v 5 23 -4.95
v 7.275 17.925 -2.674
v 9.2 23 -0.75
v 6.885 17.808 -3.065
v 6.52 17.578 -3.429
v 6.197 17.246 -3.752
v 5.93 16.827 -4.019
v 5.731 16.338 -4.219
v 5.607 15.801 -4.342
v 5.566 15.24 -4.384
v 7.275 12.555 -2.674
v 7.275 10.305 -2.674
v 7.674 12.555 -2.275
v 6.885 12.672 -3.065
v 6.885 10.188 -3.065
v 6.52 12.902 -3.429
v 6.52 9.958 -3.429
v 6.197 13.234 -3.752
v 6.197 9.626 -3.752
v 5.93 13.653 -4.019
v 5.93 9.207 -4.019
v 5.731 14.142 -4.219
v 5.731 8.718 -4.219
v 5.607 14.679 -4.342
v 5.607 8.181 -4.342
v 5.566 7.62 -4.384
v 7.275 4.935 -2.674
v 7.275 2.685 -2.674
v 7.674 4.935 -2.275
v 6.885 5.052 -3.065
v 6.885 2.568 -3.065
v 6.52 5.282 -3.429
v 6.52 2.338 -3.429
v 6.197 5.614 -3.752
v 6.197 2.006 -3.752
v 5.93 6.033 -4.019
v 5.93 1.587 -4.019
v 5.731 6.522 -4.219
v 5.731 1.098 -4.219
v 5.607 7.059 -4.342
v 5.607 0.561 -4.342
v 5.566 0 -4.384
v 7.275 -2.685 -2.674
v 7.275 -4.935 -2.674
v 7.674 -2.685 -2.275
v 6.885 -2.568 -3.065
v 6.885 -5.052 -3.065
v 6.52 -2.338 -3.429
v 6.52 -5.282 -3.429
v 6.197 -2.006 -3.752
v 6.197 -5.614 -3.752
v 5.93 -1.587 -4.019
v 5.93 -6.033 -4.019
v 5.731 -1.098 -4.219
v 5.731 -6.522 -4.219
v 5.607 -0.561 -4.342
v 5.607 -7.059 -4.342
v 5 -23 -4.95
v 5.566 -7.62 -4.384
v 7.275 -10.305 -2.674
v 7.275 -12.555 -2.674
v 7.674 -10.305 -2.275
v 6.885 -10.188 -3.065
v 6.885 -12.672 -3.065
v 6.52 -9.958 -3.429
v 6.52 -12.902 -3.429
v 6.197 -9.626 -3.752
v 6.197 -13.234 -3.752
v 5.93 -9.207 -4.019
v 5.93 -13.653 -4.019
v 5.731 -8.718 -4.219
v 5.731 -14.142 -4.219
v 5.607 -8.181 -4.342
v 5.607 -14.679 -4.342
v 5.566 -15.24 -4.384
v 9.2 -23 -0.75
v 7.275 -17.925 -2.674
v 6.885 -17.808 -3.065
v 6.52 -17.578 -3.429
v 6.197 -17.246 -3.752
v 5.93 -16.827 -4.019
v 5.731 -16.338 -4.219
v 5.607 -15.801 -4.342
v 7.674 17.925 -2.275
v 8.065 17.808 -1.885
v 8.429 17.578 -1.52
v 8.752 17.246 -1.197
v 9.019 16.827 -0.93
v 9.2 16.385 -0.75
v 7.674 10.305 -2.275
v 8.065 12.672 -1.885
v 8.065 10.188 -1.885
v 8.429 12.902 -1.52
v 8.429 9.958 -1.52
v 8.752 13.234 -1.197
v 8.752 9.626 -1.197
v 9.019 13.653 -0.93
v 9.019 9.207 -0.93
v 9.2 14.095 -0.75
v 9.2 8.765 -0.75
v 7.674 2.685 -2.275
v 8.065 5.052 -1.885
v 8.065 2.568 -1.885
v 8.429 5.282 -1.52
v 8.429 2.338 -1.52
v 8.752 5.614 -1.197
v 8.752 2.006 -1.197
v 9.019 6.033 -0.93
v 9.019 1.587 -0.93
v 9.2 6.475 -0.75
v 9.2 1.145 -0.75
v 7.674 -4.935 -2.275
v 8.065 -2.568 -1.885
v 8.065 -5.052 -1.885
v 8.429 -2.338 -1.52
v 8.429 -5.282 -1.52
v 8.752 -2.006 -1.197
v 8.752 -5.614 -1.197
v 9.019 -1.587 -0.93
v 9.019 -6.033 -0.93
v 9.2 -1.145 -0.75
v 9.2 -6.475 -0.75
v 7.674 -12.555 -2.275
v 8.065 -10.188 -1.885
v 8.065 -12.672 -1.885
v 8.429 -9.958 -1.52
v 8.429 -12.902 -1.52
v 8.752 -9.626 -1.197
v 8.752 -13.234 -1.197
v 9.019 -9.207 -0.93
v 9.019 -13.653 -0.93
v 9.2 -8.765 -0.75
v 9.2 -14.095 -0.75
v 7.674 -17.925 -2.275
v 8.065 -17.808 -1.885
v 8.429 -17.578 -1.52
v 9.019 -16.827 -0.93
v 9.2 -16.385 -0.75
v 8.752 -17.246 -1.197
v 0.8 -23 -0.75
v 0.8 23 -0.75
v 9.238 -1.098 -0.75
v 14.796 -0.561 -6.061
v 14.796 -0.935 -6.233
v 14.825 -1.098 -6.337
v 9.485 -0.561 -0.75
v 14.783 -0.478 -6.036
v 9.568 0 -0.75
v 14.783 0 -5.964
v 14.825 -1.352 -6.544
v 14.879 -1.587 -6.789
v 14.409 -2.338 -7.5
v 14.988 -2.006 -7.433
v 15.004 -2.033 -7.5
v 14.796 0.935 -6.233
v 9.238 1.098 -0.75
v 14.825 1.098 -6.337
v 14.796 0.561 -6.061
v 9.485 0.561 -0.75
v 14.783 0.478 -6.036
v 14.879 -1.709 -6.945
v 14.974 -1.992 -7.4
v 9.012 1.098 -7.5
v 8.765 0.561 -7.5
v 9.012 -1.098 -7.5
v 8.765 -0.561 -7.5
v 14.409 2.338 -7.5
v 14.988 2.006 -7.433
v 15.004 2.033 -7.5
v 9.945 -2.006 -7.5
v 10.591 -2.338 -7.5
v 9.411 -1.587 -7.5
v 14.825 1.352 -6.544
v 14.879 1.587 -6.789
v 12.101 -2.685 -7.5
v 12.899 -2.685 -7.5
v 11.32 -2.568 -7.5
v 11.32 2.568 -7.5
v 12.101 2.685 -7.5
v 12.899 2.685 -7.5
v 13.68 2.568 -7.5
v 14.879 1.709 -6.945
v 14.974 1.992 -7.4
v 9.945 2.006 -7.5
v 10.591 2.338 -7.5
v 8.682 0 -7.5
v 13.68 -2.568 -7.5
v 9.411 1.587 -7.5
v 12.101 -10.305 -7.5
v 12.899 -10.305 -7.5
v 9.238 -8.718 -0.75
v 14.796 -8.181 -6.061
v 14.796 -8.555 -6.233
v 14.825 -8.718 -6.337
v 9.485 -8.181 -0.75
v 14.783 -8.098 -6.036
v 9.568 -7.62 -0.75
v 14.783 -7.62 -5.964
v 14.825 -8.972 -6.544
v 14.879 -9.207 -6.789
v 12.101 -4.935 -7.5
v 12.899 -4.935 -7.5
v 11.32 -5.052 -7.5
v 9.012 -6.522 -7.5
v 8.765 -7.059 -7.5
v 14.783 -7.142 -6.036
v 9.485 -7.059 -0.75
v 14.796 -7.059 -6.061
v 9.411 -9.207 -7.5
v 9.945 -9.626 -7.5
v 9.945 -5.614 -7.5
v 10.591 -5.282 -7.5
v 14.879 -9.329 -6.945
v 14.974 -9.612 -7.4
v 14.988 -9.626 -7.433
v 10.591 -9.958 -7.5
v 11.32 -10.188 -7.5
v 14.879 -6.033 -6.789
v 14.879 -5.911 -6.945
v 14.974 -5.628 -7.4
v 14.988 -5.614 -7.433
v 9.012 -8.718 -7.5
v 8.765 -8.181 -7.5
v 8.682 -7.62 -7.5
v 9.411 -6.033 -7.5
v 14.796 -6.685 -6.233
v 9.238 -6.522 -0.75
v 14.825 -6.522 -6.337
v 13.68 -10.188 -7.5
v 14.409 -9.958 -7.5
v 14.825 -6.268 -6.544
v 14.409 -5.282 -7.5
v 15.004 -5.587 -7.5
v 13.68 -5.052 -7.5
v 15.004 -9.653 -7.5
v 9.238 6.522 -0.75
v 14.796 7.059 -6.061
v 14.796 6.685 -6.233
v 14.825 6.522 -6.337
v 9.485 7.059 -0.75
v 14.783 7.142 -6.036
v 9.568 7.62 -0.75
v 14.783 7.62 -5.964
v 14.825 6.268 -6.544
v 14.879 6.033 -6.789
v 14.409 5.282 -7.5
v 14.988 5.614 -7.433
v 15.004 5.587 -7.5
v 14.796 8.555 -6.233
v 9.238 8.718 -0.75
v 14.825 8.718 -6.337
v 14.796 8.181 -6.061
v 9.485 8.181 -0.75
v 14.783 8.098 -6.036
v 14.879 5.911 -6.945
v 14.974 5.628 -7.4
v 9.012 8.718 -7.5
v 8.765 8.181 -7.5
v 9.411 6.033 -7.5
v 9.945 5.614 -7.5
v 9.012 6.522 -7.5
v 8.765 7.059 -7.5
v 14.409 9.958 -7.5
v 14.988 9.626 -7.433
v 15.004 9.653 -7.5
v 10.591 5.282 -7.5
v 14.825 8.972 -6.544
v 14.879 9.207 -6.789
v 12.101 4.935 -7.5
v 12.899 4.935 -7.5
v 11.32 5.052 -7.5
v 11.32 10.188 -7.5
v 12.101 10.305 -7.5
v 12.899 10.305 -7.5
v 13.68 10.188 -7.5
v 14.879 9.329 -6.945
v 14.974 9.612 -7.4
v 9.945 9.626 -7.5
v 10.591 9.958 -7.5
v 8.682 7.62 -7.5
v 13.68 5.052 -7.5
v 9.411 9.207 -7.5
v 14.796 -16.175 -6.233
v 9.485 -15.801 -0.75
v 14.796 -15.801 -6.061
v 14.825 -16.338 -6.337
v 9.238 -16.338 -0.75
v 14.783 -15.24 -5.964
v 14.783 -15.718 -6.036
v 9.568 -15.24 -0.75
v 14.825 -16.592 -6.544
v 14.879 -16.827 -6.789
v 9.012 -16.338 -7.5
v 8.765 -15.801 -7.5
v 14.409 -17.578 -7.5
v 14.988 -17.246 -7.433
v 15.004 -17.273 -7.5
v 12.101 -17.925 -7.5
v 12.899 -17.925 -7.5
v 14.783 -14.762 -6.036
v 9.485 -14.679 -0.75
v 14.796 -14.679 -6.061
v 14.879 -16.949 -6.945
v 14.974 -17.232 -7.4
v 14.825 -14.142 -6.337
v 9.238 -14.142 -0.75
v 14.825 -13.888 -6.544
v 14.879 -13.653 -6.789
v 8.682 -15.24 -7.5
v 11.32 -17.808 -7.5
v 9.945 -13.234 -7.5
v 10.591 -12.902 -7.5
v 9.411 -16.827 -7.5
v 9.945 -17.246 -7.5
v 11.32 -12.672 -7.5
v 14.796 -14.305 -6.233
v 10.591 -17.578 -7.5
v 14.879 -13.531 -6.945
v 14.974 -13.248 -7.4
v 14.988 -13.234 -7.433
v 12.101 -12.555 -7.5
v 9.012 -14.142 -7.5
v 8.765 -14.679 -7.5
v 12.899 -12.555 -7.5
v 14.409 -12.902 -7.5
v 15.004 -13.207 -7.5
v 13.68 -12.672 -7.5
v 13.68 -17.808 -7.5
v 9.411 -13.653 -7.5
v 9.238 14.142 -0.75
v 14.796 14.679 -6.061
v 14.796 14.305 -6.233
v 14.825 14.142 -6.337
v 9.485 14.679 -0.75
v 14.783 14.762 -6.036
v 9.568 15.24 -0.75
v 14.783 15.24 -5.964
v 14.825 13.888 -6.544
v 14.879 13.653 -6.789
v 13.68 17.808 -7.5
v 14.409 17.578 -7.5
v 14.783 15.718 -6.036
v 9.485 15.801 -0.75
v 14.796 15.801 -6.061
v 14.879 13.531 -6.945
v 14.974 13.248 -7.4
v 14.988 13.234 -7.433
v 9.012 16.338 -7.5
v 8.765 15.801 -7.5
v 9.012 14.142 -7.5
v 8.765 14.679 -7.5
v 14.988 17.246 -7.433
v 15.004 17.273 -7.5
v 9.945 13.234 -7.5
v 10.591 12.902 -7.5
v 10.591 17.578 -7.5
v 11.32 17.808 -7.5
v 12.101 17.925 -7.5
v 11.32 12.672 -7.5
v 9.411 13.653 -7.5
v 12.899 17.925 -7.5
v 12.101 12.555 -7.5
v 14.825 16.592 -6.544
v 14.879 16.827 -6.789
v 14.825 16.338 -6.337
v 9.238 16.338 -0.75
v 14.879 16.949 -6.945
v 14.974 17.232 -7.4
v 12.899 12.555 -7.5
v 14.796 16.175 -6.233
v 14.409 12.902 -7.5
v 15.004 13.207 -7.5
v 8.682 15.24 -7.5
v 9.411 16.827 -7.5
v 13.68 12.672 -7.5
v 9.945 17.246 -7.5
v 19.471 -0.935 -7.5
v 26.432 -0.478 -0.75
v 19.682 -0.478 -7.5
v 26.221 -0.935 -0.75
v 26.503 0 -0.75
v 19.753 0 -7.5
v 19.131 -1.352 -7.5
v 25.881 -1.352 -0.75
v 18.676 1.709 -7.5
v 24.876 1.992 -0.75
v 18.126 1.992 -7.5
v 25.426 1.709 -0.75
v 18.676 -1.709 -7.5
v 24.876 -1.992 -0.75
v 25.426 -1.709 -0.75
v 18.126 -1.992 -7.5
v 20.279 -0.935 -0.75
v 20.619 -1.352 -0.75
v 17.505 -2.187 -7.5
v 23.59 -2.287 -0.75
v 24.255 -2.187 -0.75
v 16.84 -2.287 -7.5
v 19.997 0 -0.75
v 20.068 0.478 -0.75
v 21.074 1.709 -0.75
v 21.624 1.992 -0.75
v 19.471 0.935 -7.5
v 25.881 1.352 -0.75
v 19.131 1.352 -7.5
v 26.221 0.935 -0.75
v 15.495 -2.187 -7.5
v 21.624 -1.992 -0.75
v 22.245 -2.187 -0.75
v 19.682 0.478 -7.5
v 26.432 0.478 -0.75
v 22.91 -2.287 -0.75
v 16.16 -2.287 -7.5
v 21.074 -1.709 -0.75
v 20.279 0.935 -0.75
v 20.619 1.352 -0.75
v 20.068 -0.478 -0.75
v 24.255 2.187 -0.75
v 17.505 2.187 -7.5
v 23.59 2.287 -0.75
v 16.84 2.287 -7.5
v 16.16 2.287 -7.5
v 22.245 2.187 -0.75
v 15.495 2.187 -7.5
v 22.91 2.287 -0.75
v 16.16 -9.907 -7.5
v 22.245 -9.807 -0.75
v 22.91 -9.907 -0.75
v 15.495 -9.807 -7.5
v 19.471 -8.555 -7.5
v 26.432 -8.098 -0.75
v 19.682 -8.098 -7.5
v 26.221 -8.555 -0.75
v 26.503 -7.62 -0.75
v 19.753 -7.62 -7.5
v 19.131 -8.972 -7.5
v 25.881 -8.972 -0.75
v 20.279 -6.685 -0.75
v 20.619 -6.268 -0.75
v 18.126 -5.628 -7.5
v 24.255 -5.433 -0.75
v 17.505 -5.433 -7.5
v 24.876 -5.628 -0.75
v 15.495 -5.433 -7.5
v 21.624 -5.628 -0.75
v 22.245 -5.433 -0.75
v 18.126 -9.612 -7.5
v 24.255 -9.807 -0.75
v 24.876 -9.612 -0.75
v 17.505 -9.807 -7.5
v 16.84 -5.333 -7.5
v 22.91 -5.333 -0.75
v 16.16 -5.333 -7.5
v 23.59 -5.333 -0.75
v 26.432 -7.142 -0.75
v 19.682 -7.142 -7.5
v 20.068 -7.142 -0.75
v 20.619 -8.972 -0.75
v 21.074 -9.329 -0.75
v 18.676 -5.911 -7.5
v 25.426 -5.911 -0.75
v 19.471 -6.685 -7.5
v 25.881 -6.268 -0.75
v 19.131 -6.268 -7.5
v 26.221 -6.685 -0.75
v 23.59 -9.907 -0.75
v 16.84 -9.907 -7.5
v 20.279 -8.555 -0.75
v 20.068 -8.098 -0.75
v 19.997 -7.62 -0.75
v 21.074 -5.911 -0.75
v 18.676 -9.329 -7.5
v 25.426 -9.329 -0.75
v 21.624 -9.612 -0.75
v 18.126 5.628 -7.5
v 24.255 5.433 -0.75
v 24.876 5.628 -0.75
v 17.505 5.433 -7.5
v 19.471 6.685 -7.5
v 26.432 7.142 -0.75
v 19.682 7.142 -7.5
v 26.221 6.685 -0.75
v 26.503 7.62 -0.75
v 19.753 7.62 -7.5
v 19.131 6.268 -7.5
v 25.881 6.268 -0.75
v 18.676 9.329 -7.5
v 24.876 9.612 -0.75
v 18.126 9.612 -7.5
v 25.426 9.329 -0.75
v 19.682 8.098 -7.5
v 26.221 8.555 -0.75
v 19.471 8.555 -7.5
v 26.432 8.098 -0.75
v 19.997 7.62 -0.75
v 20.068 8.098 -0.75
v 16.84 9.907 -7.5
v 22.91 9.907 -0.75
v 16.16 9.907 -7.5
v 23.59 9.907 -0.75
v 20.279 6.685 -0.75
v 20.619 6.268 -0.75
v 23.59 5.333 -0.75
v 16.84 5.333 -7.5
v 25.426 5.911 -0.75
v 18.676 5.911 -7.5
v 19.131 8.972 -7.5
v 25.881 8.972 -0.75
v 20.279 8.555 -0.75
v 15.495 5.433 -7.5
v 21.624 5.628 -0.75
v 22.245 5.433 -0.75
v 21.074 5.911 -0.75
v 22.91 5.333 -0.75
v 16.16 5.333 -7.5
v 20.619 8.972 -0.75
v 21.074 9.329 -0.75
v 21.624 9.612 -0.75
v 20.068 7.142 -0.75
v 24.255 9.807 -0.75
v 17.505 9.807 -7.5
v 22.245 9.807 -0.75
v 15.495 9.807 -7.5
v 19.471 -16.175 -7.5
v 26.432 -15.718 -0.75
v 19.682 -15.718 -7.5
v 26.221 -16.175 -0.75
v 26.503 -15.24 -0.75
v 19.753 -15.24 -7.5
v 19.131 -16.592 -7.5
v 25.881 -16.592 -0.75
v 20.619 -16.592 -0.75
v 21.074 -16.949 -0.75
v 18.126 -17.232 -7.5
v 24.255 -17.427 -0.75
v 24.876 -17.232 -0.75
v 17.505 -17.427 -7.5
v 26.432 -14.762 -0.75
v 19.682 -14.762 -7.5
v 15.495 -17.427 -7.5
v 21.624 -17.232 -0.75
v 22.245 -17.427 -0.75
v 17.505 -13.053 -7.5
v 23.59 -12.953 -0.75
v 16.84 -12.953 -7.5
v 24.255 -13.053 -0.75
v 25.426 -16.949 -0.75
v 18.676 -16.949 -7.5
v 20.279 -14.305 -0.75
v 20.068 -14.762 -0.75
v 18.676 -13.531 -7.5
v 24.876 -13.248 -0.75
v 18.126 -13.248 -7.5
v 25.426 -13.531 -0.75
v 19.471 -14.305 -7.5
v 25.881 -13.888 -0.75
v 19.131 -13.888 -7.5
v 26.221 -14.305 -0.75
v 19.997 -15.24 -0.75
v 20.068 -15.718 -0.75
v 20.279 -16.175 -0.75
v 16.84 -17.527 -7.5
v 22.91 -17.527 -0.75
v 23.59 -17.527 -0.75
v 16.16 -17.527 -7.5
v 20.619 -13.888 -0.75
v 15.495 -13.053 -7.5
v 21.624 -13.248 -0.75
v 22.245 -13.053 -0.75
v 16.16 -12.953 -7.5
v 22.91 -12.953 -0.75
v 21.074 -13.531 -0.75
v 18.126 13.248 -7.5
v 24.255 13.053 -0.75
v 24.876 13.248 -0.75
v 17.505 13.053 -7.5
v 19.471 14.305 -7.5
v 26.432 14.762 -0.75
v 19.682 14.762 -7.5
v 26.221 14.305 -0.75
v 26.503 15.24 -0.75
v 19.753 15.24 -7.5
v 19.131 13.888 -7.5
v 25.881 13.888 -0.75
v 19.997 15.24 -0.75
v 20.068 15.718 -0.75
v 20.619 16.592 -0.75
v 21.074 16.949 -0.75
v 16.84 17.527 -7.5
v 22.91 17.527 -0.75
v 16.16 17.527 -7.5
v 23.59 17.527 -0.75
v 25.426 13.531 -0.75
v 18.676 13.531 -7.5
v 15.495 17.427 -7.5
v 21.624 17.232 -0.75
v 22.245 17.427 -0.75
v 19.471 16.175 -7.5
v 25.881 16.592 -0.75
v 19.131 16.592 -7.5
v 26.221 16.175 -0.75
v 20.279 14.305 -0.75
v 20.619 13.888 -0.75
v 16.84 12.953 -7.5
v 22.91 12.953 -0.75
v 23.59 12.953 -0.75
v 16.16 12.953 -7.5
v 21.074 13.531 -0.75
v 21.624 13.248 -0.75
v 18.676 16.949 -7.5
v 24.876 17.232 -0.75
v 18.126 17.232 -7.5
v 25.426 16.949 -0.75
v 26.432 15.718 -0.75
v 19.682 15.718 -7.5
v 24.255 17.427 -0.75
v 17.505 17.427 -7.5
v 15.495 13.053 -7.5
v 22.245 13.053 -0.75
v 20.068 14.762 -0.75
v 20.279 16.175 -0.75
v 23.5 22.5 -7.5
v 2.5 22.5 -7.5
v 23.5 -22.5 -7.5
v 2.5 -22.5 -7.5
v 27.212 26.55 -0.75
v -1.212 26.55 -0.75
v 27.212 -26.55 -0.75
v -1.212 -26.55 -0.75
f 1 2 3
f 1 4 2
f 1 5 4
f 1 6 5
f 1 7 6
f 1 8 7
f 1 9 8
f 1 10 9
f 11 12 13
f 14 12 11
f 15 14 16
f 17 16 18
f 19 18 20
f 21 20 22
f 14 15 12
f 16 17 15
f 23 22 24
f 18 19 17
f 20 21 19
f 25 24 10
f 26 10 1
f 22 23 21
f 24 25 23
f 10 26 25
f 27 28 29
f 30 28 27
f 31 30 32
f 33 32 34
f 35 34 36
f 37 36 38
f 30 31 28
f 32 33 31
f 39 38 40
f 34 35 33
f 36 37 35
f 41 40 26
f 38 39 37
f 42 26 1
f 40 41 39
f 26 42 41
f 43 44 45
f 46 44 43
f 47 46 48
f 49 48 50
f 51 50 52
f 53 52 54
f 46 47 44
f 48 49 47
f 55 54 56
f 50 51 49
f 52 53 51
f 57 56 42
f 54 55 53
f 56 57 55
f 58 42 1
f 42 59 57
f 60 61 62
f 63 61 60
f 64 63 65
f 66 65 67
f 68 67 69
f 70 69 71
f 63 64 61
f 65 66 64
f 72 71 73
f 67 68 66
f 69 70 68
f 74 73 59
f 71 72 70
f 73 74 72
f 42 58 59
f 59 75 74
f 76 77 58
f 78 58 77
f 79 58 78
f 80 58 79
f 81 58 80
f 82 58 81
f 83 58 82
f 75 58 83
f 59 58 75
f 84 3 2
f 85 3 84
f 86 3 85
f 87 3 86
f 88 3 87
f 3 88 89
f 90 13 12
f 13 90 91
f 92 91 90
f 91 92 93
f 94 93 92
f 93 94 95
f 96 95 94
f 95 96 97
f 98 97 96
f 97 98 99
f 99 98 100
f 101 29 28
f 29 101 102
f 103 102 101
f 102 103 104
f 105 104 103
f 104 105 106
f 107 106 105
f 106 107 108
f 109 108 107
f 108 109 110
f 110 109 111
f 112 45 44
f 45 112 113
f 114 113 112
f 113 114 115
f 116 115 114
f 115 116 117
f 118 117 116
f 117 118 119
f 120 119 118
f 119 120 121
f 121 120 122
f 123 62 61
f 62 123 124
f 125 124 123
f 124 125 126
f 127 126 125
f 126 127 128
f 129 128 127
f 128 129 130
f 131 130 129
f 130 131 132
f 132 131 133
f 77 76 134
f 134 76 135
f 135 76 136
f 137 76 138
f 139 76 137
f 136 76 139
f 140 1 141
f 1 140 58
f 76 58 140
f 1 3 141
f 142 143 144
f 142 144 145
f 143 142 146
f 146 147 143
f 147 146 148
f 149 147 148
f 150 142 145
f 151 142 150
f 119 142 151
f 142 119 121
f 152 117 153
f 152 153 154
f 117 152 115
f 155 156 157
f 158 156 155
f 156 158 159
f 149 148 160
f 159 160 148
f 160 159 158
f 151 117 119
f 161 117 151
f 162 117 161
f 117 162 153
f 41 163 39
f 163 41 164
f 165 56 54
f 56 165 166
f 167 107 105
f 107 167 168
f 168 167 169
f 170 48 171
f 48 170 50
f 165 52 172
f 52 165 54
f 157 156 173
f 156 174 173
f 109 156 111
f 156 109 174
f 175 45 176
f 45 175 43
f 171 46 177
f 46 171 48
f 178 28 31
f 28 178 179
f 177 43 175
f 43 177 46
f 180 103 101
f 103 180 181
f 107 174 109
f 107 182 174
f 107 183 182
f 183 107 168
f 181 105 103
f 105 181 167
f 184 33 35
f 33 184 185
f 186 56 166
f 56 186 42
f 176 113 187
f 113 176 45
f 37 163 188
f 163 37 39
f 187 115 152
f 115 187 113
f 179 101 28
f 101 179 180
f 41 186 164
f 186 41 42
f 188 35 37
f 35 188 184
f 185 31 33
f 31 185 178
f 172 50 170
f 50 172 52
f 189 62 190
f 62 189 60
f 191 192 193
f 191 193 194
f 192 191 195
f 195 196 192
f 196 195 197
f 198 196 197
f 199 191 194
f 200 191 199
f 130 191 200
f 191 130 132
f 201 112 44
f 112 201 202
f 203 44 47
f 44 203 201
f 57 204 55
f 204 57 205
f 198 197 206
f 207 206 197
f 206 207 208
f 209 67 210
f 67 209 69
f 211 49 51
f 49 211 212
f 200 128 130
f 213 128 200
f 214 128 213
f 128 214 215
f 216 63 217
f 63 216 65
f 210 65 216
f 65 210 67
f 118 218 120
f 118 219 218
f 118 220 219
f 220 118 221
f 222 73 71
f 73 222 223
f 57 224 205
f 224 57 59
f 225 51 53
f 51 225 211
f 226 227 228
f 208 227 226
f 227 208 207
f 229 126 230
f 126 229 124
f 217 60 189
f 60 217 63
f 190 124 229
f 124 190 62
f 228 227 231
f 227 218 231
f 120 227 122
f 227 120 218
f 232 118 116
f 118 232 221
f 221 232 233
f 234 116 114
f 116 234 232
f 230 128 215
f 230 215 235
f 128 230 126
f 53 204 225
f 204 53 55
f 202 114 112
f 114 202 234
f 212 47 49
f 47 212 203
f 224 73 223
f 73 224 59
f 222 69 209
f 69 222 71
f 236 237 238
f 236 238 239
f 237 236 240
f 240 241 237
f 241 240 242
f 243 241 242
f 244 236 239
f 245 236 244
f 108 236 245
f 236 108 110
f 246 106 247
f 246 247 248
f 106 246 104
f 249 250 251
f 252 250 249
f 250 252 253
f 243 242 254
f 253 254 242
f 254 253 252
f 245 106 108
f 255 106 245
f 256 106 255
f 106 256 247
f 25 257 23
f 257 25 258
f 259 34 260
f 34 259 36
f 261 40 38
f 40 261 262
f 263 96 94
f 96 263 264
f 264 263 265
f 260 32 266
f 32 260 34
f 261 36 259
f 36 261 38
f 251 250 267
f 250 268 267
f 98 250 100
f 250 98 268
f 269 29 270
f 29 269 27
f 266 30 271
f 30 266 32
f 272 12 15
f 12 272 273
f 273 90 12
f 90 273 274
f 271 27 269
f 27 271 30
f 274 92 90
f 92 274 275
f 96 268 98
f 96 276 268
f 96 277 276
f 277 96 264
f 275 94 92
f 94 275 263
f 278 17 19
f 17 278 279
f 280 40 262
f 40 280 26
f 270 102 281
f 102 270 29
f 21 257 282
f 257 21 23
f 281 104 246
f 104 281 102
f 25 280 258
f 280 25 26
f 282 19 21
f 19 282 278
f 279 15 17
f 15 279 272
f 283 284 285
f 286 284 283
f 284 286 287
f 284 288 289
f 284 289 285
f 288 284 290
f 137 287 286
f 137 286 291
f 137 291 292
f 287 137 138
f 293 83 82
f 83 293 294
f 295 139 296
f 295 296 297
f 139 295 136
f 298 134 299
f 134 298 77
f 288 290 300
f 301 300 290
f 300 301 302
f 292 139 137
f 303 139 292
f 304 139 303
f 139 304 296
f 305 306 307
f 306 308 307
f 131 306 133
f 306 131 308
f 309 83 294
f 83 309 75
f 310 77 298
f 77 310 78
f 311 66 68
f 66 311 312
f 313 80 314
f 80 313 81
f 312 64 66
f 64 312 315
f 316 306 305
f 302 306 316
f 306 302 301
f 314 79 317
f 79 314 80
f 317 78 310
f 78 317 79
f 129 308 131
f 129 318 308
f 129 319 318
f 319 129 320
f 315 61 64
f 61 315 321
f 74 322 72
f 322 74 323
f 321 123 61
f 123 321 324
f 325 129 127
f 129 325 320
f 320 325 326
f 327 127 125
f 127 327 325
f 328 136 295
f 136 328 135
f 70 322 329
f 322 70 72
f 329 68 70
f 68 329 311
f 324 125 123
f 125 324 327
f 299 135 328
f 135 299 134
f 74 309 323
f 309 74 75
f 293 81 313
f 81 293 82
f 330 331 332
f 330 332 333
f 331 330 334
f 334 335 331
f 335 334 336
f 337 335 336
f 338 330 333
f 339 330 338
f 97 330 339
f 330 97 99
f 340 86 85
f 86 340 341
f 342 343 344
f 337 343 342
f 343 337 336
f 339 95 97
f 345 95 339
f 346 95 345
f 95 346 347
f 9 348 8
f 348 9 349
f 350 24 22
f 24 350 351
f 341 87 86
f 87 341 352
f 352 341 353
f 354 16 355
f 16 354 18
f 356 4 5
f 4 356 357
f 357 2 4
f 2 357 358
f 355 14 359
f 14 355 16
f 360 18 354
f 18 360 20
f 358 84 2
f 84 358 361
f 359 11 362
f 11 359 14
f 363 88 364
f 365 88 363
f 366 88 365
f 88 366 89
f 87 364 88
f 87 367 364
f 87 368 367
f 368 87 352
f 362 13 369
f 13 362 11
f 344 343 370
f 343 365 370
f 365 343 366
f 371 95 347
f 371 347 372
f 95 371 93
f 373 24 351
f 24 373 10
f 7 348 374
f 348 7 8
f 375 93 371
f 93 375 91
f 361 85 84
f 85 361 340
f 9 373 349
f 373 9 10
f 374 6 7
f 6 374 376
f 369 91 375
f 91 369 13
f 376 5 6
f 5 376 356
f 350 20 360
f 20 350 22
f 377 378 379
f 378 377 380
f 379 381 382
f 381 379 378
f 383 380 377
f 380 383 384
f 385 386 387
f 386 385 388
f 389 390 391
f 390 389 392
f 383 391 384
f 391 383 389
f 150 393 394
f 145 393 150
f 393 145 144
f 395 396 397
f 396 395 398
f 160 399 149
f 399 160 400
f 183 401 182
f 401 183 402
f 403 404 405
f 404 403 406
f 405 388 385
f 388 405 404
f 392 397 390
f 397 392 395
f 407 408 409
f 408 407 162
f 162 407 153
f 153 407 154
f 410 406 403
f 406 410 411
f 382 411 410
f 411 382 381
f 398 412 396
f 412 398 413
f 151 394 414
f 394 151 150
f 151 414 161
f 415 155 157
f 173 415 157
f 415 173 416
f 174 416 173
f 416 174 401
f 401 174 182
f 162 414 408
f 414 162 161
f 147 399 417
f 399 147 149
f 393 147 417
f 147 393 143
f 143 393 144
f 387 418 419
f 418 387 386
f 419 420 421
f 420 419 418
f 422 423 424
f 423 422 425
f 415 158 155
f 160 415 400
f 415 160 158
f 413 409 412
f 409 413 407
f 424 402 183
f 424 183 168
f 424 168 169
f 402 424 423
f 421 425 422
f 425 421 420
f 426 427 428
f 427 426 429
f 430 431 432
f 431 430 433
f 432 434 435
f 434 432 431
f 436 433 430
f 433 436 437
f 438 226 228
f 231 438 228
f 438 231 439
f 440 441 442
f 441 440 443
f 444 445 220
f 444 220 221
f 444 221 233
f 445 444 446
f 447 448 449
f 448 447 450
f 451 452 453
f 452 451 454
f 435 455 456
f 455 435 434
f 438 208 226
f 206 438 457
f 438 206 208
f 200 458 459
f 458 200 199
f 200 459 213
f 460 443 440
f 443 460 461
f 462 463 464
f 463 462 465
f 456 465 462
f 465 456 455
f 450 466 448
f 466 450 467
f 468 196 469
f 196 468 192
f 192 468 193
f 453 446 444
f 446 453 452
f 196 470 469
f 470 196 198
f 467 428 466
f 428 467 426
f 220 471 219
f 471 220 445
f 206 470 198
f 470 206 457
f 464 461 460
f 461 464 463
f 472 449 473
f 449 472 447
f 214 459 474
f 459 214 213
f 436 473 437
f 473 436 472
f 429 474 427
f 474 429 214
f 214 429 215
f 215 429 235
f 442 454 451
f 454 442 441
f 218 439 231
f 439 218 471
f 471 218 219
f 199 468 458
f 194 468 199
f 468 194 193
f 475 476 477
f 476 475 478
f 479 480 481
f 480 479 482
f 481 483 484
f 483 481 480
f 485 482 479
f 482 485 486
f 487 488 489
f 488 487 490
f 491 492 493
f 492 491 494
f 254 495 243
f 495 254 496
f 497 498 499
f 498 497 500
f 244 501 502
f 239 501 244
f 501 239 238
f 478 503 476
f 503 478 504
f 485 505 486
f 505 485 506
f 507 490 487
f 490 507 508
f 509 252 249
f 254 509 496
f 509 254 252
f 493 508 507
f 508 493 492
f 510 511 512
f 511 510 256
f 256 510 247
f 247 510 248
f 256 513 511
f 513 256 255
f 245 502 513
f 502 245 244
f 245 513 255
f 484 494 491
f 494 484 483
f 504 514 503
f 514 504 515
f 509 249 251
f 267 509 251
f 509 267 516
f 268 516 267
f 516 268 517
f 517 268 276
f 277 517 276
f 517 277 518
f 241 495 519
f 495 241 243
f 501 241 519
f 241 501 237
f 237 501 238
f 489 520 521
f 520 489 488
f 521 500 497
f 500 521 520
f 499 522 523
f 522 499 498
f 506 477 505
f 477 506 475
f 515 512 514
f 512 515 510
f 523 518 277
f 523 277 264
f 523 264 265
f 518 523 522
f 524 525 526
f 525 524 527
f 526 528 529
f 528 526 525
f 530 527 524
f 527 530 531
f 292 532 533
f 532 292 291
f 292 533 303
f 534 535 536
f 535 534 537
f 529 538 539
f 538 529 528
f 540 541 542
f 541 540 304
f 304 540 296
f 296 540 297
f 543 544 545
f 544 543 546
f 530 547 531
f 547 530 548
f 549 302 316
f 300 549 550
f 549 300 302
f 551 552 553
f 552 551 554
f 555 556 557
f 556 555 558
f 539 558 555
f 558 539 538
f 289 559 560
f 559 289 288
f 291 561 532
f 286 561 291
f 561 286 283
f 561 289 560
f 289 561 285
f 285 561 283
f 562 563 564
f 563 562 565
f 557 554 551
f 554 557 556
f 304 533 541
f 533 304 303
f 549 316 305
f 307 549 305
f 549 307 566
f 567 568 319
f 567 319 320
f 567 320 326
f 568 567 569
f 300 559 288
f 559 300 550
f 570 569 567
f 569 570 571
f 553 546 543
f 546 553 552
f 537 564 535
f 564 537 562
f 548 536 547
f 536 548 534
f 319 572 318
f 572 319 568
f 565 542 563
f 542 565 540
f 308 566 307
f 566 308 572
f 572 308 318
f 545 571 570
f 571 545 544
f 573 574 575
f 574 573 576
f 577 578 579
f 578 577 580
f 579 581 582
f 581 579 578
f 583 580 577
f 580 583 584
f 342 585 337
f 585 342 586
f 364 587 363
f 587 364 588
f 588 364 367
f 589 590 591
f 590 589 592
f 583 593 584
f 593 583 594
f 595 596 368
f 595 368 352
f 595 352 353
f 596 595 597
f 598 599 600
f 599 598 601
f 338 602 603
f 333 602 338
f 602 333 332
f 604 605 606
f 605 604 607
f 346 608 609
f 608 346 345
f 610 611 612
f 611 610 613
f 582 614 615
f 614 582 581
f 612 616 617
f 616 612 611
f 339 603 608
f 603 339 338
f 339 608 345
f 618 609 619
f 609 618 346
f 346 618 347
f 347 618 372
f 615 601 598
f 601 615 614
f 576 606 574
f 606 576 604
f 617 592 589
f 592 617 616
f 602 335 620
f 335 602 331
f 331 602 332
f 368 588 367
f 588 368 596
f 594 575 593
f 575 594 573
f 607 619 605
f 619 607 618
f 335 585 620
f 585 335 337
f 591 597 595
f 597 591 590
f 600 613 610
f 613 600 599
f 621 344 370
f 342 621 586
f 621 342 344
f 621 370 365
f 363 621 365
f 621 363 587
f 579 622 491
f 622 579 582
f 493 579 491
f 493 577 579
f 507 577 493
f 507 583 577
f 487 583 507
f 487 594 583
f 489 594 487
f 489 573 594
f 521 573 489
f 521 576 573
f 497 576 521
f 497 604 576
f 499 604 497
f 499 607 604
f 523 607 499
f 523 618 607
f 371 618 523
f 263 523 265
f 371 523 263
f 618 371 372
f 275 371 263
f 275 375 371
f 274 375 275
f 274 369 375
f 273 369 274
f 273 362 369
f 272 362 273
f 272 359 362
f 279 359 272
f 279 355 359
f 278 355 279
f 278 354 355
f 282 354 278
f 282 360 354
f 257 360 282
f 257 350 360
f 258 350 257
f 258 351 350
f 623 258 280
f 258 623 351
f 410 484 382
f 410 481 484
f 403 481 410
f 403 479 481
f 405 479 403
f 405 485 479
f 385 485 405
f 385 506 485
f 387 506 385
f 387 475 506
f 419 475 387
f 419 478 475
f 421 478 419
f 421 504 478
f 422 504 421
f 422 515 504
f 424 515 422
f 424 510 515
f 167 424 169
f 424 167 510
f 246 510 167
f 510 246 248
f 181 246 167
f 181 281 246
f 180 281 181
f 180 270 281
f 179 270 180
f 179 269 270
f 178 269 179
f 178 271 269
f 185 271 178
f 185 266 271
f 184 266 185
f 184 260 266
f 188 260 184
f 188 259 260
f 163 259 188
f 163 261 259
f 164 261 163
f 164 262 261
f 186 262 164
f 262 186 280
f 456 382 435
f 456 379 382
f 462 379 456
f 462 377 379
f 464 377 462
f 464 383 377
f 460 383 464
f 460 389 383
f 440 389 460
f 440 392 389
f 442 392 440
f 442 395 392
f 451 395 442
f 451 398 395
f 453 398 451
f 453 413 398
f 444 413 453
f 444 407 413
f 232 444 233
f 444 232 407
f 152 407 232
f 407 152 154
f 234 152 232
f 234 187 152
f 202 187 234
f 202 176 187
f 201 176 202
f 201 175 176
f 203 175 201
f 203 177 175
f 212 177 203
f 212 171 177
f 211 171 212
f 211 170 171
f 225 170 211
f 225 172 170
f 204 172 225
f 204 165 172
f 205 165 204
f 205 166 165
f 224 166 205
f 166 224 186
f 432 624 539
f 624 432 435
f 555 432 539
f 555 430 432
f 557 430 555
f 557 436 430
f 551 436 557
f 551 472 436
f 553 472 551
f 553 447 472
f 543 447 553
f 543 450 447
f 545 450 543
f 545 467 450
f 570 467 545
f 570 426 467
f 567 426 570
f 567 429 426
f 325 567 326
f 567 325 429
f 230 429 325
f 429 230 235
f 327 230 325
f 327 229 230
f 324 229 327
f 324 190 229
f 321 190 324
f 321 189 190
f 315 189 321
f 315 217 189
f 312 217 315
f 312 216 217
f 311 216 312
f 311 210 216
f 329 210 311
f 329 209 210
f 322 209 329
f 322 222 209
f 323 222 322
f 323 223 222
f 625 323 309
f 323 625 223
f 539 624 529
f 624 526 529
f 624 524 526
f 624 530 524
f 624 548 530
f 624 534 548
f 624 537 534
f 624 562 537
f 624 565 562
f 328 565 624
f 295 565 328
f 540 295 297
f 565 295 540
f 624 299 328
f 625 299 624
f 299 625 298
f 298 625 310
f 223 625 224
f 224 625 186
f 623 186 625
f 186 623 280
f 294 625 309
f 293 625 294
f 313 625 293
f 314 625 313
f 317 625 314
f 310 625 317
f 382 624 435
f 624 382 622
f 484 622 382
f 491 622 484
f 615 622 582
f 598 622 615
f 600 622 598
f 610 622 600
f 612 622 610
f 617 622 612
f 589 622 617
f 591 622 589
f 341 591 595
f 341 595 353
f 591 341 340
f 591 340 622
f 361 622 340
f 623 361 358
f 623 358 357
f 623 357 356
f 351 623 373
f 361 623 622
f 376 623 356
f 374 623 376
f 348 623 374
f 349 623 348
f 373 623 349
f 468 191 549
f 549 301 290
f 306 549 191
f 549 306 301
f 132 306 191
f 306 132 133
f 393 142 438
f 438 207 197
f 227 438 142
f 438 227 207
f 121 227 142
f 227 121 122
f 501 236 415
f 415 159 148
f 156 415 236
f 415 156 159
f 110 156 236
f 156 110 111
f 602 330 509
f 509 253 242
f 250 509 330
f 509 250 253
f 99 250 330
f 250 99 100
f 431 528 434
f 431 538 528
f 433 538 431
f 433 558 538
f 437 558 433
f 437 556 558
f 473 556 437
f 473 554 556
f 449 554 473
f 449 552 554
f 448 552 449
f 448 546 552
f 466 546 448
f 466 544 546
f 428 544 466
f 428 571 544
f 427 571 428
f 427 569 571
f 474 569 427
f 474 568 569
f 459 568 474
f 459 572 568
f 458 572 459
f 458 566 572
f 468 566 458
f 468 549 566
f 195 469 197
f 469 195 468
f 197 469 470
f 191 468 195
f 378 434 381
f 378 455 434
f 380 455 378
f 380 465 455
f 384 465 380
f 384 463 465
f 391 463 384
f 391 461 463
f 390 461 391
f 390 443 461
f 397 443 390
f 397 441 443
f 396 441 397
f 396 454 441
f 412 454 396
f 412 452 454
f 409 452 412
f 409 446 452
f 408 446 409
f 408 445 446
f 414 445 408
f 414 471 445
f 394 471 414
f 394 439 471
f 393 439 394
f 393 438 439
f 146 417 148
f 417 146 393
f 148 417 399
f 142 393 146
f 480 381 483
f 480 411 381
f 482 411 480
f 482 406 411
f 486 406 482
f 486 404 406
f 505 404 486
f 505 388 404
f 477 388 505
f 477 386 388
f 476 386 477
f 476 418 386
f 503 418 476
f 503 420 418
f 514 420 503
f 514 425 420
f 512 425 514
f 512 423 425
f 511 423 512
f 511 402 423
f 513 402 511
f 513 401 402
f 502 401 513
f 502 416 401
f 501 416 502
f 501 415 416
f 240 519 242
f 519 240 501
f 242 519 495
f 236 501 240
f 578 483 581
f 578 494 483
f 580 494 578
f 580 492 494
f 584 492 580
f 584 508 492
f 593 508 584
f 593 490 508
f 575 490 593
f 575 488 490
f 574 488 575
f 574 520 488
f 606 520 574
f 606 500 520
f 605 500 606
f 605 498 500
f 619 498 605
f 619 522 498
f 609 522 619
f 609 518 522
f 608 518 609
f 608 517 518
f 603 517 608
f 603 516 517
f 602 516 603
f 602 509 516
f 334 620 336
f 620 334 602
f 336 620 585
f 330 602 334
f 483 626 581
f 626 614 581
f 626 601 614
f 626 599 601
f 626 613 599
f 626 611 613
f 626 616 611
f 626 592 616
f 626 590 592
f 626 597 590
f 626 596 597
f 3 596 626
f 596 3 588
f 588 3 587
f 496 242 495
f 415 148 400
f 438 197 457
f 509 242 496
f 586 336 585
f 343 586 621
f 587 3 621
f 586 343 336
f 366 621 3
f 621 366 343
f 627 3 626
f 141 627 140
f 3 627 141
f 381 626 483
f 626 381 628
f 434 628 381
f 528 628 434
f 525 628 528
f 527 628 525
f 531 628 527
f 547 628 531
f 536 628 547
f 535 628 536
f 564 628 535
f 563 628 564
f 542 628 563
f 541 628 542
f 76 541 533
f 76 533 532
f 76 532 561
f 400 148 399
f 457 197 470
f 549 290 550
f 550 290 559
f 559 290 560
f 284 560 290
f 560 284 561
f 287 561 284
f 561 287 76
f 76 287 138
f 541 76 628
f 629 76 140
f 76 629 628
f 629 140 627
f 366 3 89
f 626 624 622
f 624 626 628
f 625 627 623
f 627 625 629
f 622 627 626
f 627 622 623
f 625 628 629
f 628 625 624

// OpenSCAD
//ReaderInsert.scad (c) by Embecosm Ltd.
//
//ReaderInsert.scad is licensed under a
//Creative Commons Attribution-ShareAlike 4.0 International License.
//
//You should have received a copy of the license along with this
//work. If not, see <http://creativecommons.org/licenses/by-sa/4.0/>.

rotate([180,0,0]){
    intersection(){
        union(){
            difference(){
                //motor holster shenanigans
                translate([50,25,-4.75])
                    cube([29,25,13.5],center=true);
                translate([45,20.5,-0.75])
                    cube([13,25,11],center=true); 
                translate([33.75,36,0])
                    cube([12,10,14],center=true);
                translate([35.75,36,-2])
                    cube([16,10,10],center=true);
            };
            difference(){
                //main body
                union(){
                    translate([45,0,-2])
                        cube([120,86,19],center=true);
                };
                //motor hole
                translate([45,20.5,-0.75])
                    cube([13,25,11],center=true);
                //general central cavity
                translate([27.5,0,-9.25])
                    cube([70,58,20],center=true);
                //in tray
                translate([120,0,0])
                    cube([100,58,34],center=true);
                //wheel hole
                translate([45,0,0])
                    cube([25,25,34],center=true);
                //slanty end
                translate([139,0,-38])
                    rotate([0,45,0])
                        cube([100,146,34],center=true);
                //wire holes
                translate([11.25,36,0])
                    cube([12,10,17],center=true);
                translate([11.25,-36,0])
                    cube([12,10,17],center=true);
                translate([33.75,-36,0])
                    cube([12,10,17],center=true);
                translate([33.75,36,1.75])
                    cube([12,10,16],center=true);
                translate([35.75,36,-0.75])
                    cube([16,10,11],center=true);
                //connections to main cavity
                translate([11.25,0,-9.25])
                    cube([12,82,20],center=true);
                translate([33.75,-18,-9.25])
                    cube([12,46,20],center=true);
                //LED Holes
                translate([5,0,0])
                    rotate([0,45,0])
                        union(){
                            cube([7,46,7], center=true);
                                cylinder(r=2.7, h=27, center=true, $fn=30);
                                translate([0,7.62,0])
                                        cylinder(r=2.7, h=27, center=true, $fn=30);
                                translate([0,-7.62,0])
                                        cylinder(r=2.7, h=27, center=true, $fn=30);
                                translate([0,15.24,0])
                                        cylinder(r=2.7, h=27, center=true, $fn=30);
                                translate([0,-15.24,0])
                                        cylinder(r=2.7, h=27, center=true, $fn=30);
                            };
                //LDR Holes
                translate([24,0,0])
                    rotate([0,-45,0])
                        union(){
                                cylinder(r=2.3, h=27, center=true, $fn=30);
                                translate([0,7.62,0])
                                        cylinder(r=2.3, h=27, center=true, $fn=30);
                                translate([0,-7.62,0])
                                        cylinder(r=2.3, h=27, center=true, $fn=30);
                                translate([0,15.24,0])
                                        cylinder(r=2.3, h=27, center=true, $fn=30);
                                translate([0,-15.24,0])
                                        cylinder(r=2.3, h=27, center=true, $fn=30);
                            };
                //Bolt holes
                union(){
                    translate([0,36,0])
                            cylinder(r=1.6, h=22, center=true, $fn=30);
                    translate([0,-36,0])
                            cylinder(r=1.6, h=22, center=true, $fn=30);
                    translate([0,36,-8])
                            cylinder(r=3.2, h=12, center=true, $fn=30);
                    translate([0,-36,-8])
                            cylinder(r=3.2, h=12, center=true, $fn=30);
                };
                translate([45,0,0]){
                    union(){
                        translate([0,-36,0])
                                cylinder(r=1.6, h=22, center=true, $fn=30);
                        translate([0,-36,-8])
                                cylinder(r=3.2, h=12, center=true, $fn=30);
                    };
                };
                translate([90,0,0]){
                    union(){
                        translate([0,36,0])
                                cylinder(r=1.6, h=22, center=true, $fn=30);
                        translate([0,-36,0])
                                cylinder(r=1.6, h=22, center=true, $fn=30);
                        translate([0,36,-8])
                                cylinder(r=3.2, h=12, center=true, $fn=30);
                        translate([0,-36,-8])
                                cylinder(r=3.2, h=12, center=true, $fn=30);
                    };
                };
            };
        };
        hull(){
            translate([13,0,7])
                cube([21,45,1],center=true);
            translate([13,0,-3])
                cube([32,57,1],center=true);
        };            
    };
};
